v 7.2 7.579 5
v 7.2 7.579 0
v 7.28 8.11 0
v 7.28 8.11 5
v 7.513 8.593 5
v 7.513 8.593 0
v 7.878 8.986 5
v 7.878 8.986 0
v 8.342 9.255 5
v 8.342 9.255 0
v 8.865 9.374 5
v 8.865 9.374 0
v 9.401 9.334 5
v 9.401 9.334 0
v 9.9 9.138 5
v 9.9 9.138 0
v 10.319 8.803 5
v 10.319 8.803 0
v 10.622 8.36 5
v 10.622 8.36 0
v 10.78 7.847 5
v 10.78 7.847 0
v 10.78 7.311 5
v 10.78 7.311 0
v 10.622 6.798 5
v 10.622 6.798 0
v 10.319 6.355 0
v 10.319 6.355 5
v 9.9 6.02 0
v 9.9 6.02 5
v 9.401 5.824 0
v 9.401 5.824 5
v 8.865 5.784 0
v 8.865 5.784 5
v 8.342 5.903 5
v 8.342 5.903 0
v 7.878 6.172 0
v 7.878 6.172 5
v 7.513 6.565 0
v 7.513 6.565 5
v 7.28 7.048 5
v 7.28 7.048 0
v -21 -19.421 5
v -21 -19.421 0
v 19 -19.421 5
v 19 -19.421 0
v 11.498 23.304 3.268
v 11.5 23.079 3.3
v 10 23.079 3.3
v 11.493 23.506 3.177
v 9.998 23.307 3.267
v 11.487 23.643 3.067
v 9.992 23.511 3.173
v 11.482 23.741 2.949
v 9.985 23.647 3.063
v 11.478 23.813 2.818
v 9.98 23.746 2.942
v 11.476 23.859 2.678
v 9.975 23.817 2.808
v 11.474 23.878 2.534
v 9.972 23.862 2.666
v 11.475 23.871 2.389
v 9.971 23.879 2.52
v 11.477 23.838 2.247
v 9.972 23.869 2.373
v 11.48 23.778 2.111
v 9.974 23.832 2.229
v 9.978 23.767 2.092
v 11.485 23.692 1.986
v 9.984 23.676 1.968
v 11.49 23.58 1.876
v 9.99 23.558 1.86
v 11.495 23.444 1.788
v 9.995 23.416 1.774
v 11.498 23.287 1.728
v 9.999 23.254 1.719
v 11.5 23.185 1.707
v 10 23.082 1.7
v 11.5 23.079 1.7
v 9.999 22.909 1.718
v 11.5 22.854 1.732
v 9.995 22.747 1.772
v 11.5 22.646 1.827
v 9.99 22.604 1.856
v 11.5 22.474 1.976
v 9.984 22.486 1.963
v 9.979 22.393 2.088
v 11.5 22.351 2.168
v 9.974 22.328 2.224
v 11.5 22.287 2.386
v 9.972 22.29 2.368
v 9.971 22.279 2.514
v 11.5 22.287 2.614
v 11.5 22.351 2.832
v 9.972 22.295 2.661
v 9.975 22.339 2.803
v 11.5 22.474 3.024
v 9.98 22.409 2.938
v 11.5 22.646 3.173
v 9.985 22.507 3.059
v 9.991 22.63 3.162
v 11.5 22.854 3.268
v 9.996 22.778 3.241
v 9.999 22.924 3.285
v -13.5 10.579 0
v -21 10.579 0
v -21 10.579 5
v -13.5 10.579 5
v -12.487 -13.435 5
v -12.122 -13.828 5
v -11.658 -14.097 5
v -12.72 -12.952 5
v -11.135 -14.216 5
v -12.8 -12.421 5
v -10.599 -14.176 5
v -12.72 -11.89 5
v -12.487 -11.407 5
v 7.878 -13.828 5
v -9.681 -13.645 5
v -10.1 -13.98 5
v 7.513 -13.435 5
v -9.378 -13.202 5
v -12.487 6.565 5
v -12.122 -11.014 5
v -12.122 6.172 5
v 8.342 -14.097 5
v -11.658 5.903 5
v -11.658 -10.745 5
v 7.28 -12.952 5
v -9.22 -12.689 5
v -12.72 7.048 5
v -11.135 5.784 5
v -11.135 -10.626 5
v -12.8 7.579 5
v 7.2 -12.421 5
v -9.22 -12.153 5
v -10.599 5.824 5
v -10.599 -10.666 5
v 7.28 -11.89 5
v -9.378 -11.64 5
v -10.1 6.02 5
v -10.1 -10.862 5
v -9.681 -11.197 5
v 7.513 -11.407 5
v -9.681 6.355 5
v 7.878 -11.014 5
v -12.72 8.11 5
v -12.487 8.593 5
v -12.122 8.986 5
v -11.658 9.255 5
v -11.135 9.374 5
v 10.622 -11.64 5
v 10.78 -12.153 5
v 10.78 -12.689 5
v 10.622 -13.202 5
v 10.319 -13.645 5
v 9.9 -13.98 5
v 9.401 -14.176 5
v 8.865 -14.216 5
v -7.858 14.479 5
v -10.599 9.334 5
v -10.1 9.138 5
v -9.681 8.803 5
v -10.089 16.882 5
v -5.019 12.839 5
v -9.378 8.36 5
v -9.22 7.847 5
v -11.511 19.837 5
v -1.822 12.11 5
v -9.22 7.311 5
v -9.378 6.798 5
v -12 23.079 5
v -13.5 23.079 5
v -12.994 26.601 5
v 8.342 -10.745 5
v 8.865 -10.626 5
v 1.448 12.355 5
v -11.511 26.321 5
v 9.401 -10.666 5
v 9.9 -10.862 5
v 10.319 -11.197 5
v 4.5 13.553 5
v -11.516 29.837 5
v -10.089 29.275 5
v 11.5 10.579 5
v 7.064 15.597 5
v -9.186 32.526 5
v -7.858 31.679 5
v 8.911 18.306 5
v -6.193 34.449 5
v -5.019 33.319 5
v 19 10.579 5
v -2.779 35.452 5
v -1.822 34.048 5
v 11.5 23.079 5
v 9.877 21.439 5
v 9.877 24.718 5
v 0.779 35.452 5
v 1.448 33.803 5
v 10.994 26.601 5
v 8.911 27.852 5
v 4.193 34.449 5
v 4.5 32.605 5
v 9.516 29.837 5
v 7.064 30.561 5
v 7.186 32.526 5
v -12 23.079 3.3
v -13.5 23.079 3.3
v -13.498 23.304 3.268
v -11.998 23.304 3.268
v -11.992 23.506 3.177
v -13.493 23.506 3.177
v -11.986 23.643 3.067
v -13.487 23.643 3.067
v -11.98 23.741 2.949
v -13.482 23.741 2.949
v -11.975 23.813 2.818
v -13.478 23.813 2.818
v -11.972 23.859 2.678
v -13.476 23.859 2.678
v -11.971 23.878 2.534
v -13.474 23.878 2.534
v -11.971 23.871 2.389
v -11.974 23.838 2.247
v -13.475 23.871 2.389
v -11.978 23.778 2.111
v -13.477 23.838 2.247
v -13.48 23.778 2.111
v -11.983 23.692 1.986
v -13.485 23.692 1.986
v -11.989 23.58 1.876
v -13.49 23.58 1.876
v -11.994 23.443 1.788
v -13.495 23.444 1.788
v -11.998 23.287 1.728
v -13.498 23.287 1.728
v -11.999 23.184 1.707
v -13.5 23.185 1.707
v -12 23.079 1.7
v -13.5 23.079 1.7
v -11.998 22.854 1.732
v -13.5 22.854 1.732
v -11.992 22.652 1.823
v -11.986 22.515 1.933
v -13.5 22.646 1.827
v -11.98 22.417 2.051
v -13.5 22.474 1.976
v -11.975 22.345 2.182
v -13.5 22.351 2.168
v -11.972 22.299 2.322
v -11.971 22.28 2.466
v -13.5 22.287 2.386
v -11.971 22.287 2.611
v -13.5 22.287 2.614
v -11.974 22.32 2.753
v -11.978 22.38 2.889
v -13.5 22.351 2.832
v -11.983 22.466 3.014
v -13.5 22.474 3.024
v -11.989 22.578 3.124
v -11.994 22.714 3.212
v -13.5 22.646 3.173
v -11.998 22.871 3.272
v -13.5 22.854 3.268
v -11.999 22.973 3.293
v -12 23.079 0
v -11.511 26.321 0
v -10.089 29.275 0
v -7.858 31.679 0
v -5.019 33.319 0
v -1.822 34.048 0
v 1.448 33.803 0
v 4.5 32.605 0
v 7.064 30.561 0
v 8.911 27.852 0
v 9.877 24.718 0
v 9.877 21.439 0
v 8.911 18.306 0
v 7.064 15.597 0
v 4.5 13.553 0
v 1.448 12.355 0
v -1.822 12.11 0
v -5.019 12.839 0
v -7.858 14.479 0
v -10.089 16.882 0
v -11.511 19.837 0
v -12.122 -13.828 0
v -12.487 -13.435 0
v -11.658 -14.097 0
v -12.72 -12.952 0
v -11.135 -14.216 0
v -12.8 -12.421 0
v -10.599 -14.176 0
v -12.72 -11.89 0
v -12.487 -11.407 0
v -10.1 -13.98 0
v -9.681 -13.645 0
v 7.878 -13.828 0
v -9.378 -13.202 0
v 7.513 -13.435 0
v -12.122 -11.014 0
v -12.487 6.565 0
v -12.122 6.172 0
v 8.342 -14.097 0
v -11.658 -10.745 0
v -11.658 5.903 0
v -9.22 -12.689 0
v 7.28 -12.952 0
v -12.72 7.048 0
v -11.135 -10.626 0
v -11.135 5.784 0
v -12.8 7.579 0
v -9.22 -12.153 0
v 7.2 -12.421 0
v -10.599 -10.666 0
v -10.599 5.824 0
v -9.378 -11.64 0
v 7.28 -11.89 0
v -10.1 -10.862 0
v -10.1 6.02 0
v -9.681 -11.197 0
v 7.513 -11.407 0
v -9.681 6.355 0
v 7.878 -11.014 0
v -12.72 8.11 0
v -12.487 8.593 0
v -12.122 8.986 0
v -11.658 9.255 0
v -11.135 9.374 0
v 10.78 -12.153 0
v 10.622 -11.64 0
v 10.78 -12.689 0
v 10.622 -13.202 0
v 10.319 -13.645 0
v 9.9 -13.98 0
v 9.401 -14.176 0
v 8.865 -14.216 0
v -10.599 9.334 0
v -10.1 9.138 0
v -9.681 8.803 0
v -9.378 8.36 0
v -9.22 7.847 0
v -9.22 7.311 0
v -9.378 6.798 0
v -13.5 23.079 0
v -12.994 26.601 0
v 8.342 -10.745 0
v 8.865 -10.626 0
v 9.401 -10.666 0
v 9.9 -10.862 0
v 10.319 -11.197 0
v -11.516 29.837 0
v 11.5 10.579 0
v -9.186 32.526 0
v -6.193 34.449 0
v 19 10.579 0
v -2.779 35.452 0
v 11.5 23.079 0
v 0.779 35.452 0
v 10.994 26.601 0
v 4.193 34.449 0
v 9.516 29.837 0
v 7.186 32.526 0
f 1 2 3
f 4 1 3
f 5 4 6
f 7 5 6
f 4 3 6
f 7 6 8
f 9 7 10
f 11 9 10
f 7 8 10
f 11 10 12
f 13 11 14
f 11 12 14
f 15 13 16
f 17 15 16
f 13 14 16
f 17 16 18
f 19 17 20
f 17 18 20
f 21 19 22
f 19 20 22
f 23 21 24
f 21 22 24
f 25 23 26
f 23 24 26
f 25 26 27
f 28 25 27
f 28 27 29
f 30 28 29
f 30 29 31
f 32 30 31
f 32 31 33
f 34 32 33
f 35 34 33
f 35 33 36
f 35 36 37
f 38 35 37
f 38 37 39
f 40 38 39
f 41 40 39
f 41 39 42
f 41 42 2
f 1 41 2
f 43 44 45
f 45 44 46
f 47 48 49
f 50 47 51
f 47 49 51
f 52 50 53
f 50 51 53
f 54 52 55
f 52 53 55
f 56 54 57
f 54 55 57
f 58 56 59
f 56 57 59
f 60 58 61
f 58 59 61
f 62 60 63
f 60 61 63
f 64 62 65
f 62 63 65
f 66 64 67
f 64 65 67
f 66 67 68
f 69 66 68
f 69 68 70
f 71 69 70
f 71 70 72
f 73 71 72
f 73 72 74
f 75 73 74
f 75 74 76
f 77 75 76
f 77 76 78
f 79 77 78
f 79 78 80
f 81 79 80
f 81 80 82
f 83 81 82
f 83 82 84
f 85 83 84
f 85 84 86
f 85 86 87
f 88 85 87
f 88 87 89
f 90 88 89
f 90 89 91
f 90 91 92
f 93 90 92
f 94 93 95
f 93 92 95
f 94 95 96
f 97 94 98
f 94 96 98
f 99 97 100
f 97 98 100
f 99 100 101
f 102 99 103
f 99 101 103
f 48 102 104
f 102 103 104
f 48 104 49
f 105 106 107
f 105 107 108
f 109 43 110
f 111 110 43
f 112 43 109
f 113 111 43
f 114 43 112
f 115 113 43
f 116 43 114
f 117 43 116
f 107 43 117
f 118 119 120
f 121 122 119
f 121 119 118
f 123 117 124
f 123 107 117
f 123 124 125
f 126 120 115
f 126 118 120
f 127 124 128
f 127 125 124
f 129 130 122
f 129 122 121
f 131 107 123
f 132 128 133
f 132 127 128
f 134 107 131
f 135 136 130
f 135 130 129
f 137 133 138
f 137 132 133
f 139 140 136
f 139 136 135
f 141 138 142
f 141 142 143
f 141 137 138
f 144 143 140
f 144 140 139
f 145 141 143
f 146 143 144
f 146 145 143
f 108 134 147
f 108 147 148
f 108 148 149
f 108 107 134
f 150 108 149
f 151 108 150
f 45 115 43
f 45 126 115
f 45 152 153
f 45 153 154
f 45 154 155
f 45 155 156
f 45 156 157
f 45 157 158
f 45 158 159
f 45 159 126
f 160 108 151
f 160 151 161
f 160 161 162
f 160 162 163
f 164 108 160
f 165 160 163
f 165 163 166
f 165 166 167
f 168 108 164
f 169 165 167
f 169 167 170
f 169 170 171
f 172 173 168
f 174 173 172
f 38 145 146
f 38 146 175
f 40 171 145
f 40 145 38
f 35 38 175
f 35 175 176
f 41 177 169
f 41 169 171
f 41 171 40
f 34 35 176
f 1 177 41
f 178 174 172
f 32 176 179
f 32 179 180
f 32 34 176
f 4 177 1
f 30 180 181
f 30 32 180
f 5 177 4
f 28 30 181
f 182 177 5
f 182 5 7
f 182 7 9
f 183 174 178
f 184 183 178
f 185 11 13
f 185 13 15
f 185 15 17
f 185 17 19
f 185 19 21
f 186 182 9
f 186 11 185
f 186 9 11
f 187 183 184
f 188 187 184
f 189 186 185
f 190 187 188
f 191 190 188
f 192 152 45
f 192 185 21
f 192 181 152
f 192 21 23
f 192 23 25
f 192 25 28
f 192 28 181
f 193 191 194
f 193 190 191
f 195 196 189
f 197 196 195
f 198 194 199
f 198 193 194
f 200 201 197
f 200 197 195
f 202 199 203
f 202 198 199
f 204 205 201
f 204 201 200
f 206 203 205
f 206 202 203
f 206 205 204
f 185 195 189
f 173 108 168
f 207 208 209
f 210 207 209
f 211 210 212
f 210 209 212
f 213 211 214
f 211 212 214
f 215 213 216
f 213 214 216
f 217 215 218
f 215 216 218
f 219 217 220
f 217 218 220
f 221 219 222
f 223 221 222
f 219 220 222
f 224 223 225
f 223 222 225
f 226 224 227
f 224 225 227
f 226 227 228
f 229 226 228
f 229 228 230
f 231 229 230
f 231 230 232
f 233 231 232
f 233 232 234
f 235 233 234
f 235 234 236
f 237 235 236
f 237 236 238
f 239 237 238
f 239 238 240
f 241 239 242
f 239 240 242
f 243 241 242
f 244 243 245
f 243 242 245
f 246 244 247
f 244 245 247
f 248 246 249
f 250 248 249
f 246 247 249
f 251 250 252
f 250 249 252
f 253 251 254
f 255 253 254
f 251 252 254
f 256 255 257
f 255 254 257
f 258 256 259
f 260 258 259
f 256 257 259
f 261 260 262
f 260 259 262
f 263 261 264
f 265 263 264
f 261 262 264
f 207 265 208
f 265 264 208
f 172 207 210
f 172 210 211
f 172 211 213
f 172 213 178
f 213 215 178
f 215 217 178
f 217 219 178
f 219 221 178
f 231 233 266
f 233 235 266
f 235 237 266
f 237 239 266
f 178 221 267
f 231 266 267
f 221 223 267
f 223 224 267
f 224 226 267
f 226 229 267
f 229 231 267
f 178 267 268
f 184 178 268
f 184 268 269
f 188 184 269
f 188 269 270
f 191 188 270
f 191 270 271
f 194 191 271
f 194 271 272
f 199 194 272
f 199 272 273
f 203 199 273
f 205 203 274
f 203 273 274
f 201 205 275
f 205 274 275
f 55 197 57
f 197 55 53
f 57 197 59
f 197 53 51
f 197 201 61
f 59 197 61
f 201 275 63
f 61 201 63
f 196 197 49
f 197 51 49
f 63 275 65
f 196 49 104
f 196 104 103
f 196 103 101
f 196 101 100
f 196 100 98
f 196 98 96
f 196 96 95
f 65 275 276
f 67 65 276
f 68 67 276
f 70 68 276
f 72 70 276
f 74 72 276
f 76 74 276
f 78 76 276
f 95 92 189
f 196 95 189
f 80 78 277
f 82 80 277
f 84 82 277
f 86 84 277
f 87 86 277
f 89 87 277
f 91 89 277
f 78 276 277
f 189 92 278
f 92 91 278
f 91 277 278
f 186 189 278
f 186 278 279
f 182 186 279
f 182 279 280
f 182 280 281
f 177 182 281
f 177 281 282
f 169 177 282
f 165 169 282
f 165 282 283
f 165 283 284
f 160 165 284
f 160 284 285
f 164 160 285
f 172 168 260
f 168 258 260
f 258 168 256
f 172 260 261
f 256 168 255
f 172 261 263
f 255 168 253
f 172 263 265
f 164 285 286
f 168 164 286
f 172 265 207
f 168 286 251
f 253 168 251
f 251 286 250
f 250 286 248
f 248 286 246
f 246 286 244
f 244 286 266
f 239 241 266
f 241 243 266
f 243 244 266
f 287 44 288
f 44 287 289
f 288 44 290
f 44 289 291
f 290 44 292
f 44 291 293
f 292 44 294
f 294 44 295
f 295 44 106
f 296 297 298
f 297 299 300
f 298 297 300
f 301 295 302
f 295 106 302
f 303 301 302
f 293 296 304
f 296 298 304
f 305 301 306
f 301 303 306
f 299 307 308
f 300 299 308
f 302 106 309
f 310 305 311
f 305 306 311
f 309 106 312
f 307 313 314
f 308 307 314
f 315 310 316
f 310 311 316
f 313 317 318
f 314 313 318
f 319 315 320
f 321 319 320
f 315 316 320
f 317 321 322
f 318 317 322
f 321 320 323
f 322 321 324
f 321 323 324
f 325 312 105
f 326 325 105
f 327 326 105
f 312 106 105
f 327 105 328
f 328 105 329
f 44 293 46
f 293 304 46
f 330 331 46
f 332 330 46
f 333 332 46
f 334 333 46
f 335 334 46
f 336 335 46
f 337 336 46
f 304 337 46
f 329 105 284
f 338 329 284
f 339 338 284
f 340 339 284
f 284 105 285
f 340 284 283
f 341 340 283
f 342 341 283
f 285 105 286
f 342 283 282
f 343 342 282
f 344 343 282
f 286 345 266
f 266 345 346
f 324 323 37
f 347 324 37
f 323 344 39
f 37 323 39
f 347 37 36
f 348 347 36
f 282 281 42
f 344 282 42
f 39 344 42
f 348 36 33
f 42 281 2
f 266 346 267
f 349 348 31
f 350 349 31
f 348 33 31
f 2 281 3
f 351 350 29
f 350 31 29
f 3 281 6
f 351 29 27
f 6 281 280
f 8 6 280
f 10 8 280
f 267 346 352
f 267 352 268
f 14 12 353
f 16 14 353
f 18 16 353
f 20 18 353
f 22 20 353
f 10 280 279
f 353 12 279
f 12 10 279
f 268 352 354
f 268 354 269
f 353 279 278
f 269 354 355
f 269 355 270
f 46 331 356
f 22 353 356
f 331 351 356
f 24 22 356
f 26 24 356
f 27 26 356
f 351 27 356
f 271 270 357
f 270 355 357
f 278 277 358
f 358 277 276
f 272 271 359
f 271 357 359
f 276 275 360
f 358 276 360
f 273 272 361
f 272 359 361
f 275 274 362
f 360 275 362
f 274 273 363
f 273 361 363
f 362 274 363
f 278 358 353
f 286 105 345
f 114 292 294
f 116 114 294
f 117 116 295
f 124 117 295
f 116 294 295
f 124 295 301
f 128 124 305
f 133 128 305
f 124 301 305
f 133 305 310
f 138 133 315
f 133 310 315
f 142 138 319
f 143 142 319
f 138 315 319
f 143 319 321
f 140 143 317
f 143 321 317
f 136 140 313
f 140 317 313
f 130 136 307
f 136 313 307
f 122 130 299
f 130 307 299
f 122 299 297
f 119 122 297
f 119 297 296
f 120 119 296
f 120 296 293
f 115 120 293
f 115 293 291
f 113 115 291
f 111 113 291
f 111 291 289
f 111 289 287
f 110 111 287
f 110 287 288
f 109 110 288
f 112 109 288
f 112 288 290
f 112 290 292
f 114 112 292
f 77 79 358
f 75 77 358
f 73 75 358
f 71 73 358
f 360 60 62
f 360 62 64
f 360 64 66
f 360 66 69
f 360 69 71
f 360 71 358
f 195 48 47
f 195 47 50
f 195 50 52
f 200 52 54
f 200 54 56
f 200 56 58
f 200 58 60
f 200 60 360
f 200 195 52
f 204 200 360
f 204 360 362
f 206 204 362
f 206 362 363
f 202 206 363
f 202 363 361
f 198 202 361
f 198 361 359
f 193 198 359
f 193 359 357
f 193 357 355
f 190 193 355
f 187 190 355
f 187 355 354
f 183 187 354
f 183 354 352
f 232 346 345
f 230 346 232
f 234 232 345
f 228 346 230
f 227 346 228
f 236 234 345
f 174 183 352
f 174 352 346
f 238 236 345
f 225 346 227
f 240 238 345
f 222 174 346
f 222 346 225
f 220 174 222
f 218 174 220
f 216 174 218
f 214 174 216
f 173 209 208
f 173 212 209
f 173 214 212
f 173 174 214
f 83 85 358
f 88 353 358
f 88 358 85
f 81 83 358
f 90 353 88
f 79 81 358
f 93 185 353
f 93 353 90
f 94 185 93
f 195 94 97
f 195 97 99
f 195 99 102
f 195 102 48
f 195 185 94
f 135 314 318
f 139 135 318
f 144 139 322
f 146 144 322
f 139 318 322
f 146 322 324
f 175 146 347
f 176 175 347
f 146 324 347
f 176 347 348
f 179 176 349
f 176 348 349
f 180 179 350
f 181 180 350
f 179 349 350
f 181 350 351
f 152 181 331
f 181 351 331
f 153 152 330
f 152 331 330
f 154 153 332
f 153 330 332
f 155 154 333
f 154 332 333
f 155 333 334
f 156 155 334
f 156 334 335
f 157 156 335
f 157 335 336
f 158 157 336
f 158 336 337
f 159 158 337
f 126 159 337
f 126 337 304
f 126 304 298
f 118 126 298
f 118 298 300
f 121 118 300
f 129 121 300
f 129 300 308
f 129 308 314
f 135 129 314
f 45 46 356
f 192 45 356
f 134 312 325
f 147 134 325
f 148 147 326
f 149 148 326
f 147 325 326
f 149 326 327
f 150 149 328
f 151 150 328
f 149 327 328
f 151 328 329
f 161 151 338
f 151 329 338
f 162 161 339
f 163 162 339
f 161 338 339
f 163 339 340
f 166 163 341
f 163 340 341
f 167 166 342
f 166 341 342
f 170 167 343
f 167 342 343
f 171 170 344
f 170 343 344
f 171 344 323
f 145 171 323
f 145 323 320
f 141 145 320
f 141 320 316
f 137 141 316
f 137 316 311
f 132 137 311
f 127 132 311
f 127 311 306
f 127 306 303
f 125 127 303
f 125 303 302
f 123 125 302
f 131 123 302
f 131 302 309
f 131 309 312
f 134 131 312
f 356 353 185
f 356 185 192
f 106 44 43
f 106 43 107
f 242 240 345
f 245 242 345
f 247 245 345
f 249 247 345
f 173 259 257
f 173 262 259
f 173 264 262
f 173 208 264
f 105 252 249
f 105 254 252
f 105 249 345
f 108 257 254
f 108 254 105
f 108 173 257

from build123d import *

# Parameters (mm, degrees)
ESQUISSE1_W                               = 40
ESQUISSE1_H                               = 30
BOSS_EXTRU_1_DEPTH                        = 5
BOSS_EXTRU_2_DEPTH                        = 5
TROUS_DE_CENTRAGE_1_0MM1_D                = 22
D_GAGEMENT_M34_D                          = 3.6
TROU_POUR_TARAUDAGE_POUR_TROU_TARAUD_M2_D = 1.6


with BuildPart() as part:
    # Esquisse1 → Boss.-Extru.1 (new body)
    with BuildSketch(Plane.XY):
        with Locations((-1, -4.421052632)):
            Rectangle(ESQUISSE1_W, ESQUISSE1_H)
    extrude(amount=BOSS_EXTRU_1_DEPTH)

    # Esquisse2 → Boss.-Extru.2 (add)
    with BuildSketch(Plane.XY.offset(5)):
        with BuildLine():
            Line((-13.5, 10.578947368), (11.5, 10.578947368))
            Line((11.5, 10.578947368), (11.5, 23.078947368))
            ThreePointArc((11.5, 23.078947368), (-1, 35.578947368), (-13.5, 23.078947368))
            Line((-13.5, 23.078947368), (-13.5, 10.578947368))
        make_face()
    extrude(amount=-BOSS_EXTRU_2_DEPTH)

    # Trous de centrage Ø1.0mm1 (through all)
    with Locations(Plane.XY.offset(5)):
        with Locations((-1, 23.078947368)):
            Hole(TROUS_DE_CENTRAGE_1_0MM1_D / 2)

    # Dégagement M34 (through all)
    with Locations(Plane.XY.offset(5)):
        with Locations((9, 7.578947368), (-11, 7.578947368), (-11, -12.421052632), (9, -12.421052632)):
            Hole(D_GAGEMENT_M34_D / 2)

    # Trou pour taraudage pour trou taraudé M23 (through all)
    with Locations(Plane(origin=(11.5, 0, 0), x_dir=(0, 0, -1), z_dir=(1, 0, 0))):
        with Locations((-2.5, 23.078947368)):
            Hole(TROU_POUR_TARAUDAGE_POUR_TROU_TARAUD_M2_D / 2)


solid = part.part
